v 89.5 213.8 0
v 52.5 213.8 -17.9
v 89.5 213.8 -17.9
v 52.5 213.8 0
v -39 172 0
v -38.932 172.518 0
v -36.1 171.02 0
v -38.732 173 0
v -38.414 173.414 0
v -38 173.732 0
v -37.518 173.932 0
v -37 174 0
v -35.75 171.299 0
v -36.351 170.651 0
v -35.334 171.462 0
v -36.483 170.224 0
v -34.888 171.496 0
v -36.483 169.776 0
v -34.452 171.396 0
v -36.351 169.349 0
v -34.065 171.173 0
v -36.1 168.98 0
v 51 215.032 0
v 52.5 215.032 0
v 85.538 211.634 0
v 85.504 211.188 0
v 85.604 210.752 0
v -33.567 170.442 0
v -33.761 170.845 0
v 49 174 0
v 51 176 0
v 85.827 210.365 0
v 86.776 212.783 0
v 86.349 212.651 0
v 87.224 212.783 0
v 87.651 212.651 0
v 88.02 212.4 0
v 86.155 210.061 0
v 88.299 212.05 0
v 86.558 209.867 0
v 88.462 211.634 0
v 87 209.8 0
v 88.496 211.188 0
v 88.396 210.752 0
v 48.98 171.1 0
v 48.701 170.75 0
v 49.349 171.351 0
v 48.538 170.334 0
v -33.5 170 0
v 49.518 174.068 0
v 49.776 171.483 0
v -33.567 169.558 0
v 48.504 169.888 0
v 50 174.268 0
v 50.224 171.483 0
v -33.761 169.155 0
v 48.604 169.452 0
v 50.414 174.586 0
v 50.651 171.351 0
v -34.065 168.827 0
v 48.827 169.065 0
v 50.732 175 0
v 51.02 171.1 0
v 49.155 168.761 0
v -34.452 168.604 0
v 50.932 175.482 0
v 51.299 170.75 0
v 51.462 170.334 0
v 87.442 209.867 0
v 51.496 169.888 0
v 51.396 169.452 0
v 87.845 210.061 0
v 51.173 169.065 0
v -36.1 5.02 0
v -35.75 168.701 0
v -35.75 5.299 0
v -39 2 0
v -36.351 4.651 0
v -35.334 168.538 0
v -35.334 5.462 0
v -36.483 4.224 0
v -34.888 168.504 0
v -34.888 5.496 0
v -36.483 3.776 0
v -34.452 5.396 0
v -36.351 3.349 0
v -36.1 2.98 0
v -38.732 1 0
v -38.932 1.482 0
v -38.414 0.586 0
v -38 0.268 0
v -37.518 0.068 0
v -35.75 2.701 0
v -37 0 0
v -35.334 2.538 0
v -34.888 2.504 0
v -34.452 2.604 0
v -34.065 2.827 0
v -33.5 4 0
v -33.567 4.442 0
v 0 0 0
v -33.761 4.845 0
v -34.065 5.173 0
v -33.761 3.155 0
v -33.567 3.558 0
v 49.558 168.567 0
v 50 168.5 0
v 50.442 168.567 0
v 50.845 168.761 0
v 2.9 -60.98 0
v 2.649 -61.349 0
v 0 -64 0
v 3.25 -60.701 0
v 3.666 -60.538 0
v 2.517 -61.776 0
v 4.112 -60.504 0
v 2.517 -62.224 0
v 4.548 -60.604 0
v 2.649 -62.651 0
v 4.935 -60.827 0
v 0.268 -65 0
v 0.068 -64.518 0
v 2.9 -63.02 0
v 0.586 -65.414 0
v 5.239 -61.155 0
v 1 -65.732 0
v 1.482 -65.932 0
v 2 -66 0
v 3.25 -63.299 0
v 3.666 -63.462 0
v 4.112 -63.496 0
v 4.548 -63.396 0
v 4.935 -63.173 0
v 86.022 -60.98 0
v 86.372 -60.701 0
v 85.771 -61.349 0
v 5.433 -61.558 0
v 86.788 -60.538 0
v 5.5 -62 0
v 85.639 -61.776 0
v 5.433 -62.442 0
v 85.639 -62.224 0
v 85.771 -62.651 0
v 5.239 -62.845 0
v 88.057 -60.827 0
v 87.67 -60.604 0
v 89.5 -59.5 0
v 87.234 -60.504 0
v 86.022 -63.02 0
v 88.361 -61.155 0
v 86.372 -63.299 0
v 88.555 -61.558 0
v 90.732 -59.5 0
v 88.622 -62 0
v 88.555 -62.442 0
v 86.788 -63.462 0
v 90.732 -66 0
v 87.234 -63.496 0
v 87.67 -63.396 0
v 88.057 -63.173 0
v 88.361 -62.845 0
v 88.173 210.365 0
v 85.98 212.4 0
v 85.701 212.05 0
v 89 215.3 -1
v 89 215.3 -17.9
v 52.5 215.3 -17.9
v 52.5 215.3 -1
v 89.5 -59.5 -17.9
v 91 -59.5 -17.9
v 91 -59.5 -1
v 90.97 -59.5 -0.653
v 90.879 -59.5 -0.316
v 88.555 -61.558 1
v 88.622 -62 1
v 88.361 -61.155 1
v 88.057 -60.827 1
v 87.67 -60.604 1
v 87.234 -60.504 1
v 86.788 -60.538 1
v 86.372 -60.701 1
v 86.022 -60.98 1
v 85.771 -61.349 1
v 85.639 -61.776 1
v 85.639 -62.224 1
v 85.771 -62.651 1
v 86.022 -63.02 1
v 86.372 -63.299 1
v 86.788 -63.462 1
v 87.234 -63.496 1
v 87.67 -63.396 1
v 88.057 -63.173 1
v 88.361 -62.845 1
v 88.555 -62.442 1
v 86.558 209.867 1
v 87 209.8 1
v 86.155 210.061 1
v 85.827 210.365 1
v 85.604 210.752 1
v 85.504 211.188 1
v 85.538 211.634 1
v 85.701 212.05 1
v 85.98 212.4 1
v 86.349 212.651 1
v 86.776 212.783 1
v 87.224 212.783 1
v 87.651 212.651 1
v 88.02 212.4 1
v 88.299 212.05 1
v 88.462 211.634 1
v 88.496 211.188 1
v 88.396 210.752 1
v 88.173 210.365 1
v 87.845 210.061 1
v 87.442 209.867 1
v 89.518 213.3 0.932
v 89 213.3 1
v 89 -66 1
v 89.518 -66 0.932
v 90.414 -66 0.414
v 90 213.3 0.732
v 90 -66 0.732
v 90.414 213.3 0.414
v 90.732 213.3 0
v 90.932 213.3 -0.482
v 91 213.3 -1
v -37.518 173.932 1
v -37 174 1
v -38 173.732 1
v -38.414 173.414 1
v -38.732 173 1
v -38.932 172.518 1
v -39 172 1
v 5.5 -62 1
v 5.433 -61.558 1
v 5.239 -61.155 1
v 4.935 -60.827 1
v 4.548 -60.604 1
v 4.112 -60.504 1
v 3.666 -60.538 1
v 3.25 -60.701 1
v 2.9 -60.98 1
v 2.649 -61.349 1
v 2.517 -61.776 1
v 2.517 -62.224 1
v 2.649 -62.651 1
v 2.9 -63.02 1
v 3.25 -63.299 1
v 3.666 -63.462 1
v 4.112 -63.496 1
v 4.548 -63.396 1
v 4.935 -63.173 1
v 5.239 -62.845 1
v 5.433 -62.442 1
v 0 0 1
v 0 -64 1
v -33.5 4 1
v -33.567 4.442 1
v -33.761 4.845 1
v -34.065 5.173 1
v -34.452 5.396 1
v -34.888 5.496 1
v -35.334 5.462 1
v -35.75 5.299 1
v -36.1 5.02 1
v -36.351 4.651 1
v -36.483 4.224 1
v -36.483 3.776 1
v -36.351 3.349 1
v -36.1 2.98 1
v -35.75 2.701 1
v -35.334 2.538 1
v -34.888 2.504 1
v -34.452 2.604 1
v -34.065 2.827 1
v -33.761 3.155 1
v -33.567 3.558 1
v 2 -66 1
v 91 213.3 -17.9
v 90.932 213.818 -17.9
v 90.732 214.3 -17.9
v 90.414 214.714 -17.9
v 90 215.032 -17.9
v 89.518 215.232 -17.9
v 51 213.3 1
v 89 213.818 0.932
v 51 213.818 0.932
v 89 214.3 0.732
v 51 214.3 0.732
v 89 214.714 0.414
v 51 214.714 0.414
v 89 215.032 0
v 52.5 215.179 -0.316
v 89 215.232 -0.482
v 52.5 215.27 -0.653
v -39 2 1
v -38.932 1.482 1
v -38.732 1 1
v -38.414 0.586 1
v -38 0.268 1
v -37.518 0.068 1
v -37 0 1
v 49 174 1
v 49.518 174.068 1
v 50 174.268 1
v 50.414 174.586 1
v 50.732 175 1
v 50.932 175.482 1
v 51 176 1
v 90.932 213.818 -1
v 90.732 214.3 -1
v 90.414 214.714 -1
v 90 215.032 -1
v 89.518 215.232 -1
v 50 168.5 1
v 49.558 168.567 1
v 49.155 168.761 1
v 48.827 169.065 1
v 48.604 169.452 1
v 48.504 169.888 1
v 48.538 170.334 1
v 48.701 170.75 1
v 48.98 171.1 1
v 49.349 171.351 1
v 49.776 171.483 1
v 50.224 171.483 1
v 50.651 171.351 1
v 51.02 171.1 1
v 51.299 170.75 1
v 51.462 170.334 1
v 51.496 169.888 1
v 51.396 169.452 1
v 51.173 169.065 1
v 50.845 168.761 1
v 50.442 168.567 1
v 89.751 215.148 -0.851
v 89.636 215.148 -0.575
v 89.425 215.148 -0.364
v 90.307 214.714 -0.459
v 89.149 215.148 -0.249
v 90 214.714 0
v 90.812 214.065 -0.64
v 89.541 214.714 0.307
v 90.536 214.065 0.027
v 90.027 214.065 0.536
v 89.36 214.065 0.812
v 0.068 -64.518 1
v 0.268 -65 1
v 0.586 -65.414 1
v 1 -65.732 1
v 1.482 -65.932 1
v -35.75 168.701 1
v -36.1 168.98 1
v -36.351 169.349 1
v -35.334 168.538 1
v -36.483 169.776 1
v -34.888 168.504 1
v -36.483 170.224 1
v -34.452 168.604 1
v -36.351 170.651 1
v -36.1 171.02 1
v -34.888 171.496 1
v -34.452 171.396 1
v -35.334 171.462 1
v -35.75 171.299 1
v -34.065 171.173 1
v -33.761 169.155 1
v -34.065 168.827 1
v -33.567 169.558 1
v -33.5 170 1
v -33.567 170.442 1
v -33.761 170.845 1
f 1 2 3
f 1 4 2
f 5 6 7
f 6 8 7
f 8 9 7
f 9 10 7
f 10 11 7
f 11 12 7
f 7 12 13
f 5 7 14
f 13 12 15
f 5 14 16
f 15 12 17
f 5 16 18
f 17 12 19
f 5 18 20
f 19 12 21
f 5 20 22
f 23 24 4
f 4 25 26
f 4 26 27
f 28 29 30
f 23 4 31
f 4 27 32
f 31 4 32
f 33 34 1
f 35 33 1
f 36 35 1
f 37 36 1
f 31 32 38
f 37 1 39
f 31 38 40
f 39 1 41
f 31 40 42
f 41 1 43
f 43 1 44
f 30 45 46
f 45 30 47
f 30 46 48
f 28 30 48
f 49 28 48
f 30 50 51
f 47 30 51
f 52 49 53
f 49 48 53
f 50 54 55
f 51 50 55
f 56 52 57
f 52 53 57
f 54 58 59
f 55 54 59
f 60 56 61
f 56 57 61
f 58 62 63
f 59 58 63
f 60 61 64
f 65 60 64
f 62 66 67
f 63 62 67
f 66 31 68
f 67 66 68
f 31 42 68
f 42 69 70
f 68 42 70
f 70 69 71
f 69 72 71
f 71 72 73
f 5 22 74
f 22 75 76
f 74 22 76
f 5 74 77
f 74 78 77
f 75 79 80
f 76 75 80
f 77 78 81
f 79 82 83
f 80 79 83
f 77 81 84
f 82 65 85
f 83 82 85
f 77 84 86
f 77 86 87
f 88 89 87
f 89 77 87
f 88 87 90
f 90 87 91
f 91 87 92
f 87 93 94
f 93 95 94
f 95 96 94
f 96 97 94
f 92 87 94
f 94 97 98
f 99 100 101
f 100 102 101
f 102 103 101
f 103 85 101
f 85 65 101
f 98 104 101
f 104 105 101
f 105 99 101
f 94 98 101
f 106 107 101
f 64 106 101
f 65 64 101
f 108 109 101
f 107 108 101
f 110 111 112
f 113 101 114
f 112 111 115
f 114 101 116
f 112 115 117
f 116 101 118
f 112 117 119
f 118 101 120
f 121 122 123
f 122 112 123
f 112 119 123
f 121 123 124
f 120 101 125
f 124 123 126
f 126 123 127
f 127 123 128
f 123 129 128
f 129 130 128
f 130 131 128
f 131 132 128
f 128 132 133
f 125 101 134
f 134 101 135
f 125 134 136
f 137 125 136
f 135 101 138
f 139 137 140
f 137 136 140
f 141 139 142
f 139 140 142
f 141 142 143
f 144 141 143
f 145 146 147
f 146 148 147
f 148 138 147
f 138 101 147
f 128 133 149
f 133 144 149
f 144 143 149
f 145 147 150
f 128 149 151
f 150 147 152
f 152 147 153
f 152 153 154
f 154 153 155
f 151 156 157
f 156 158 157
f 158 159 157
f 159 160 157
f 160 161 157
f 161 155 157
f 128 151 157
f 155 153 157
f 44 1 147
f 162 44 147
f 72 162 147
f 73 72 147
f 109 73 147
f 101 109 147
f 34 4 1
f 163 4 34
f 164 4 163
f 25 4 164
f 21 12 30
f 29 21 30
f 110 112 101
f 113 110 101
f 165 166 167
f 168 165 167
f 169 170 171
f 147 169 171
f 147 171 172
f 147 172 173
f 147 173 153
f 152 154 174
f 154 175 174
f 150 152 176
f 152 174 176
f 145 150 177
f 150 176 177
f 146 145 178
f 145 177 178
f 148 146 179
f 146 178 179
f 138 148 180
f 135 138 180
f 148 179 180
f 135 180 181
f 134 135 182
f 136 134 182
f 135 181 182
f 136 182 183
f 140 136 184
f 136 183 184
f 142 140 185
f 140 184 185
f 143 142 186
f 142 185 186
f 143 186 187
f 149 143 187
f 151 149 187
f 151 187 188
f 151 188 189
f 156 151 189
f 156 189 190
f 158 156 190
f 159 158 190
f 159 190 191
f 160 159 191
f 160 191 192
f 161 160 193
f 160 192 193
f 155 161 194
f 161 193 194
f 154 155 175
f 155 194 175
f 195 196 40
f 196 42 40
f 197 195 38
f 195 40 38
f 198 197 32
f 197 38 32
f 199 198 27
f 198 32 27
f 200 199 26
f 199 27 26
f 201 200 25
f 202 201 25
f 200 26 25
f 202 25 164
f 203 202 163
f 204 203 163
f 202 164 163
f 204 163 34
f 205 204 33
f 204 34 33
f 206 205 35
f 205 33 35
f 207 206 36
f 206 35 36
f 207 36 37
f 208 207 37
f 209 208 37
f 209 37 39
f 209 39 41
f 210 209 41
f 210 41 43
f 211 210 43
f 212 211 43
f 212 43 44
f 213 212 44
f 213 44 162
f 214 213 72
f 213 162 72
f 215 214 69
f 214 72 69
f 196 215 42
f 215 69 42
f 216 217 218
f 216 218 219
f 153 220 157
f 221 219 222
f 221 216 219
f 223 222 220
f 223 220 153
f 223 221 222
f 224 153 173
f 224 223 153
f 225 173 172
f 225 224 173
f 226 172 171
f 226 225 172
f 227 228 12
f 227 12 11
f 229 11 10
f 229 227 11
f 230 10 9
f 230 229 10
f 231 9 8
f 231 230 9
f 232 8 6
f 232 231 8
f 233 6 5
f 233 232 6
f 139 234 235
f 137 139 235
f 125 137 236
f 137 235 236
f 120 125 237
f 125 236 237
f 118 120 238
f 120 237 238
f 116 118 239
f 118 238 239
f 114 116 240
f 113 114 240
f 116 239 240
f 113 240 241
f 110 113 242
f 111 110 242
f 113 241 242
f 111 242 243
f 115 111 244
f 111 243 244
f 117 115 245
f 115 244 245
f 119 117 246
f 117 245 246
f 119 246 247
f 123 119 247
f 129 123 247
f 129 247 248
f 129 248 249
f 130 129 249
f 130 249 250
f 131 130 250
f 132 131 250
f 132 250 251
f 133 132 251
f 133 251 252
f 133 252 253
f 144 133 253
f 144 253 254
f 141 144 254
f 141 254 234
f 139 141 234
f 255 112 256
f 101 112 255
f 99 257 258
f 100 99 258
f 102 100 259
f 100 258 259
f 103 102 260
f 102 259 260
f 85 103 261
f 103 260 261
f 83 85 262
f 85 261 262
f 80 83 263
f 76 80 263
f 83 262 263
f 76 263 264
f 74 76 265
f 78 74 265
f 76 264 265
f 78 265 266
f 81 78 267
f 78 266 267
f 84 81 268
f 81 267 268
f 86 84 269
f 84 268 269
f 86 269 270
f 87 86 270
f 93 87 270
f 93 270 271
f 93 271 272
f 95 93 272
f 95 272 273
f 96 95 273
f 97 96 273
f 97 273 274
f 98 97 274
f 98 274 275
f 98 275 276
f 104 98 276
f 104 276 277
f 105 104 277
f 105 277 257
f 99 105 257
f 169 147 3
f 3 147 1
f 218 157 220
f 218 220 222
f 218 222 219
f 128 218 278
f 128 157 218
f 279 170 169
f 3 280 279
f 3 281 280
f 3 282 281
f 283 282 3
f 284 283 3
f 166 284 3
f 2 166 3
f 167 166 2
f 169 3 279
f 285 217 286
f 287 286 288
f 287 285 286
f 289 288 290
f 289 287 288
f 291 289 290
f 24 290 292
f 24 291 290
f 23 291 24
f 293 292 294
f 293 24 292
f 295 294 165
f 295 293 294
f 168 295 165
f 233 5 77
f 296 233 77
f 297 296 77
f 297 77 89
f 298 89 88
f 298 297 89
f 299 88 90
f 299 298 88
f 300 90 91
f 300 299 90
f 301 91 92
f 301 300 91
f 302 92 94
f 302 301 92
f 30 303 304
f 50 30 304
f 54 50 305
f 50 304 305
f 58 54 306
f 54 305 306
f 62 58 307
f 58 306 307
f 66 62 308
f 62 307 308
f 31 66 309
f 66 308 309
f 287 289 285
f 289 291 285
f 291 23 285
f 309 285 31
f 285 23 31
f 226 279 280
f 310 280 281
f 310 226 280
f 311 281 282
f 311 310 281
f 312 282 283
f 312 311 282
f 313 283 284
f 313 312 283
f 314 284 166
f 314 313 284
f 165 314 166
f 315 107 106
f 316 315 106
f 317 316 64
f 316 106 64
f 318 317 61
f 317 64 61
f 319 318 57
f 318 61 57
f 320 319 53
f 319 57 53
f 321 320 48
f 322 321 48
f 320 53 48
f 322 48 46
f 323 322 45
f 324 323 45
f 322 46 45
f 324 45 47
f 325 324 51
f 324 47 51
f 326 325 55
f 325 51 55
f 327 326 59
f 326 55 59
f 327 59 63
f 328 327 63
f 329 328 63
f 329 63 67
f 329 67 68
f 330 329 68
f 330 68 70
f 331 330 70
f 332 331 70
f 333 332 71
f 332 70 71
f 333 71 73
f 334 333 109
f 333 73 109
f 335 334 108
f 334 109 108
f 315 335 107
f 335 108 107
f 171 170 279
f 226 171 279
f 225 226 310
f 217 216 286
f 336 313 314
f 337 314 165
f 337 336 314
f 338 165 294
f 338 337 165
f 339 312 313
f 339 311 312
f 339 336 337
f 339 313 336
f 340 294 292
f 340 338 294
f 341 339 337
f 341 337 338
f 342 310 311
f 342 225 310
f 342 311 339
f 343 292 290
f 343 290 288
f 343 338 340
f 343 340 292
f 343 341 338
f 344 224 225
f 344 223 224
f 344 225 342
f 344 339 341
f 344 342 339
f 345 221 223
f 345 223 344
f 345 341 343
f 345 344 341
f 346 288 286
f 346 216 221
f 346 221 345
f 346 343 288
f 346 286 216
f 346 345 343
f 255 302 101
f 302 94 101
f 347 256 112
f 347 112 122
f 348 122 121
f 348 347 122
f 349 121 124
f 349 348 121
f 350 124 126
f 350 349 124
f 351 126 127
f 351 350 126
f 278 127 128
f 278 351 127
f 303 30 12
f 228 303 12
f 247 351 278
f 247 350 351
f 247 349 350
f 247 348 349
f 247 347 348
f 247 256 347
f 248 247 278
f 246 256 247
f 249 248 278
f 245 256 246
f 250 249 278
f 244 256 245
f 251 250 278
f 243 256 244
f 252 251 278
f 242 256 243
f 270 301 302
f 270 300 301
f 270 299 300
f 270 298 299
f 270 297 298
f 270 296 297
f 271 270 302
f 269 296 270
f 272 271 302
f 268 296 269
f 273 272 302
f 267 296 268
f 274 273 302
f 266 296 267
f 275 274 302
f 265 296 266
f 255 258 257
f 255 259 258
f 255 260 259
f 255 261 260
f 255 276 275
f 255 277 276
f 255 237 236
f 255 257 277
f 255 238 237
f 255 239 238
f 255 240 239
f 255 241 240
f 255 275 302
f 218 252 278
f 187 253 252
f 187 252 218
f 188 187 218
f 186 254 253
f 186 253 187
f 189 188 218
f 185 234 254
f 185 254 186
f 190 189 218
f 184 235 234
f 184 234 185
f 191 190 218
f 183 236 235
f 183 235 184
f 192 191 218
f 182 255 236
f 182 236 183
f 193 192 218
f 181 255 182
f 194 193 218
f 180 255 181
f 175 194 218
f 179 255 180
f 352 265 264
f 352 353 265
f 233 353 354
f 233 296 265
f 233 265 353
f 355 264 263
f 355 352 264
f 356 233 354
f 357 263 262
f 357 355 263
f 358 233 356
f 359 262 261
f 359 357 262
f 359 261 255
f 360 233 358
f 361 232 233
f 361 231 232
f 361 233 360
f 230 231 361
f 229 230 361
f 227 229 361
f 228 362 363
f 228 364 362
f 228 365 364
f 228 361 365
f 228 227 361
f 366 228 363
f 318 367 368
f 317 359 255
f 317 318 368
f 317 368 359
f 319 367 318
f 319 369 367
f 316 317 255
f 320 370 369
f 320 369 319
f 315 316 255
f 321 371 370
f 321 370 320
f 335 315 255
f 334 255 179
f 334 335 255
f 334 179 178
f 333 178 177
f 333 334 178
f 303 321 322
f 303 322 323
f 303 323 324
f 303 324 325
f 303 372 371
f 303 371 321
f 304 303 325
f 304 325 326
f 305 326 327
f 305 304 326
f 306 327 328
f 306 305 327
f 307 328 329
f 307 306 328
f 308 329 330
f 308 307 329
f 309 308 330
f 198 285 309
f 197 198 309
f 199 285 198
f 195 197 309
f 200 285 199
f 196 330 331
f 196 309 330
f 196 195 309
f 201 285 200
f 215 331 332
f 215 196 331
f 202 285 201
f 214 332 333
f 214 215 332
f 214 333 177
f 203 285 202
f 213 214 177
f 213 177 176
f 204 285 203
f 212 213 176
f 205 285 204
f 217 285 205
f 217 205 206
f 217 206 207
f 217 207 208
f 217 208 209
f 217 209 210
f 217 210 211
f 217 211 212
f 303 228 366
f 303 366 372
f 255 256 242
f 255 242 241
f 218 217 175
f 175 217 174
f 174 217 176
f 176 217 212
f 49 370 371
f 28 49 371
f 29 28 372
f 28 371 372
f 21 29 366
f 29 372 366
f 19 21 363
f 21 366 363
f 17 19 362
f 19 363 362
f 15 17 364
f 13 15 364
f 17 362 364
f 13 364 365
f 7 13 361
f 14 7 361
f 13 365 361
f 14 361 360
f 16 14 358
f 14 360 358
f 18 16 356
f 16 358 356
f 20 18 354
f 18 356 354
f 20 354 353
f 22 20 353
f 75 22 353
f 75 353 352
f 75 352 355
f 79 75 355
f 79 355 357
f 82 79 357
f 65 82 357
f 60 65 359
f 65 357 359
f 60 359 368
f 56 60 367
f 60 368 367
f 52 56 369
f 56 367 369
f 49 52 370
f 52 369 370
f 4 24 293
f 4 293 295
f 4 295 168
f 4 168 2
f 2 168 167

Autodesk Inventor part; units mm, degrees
ref_plane "YZ Plane" through (0, 0, 0) normal (1, 0, 0) x (0, 1, 0)
ref_plane "XZ Plane" through (0, 0, 0) normal (0, 1, 0) x (-1, 0, 0)
ref_plane "XY Plane" through (0, 0, 0) normal (0, 0, 1) x (1, 0, 0)
sketch "Skizze2" plane through (0, 0, 0) normal (0, 0, 1) x (1, 0, 0)
  line L0 (91, -66) -> (91, 215.3)
  line L1 (91, -66) -> (0, -66)
  line L2 (0, -66) -> (0, 0)
  line L3 (91, 215.3) -> (51, 215.3)
  line L4 (51, 215.3) -> (51, 174)
  line L5 (51, 174) -> (-39, 174)
  line L6 (-39, 174) -> (-39, 0)
  line L7 (-39, 0) -> (0, 0)
  line L8 (0, 0) -> (91, 0) construction
  dimension "d0" = 281.3
  dimension "d1" = 91
  dimension "d2" = 66
  dimension "d3" = 40
  dimension "d4" = 41.3
  dimension "d5" = 90
extrude "Extrusion1" add sketch "Skizze2" along normal blind 1
sketch "Skizze3" plane through (0, 0, 1) normal (0, 0, 1) x (1, 0, 0)
  circle A0 centre (4, -62) radius 1.5
  line L0 (0, -66) -> (91, -66) projected
  line L1 (0, 0) -> (0, -66) projected
  circle A1 centre (87.122, -62) radius 1.5
  line L2 (91, -66) -> (91, 215.3) projected
  circle A2 centre (-35, 4) radius 1.5
  line L3 (-39, 0) -> (0, 0) projected
  line L4 (-39, 174) -> (-39, 0) projected
  circle A3 centre (-35, 170) radius 1.5
  line L5 (51, 174) -> (-39, 174) projected
  dimension "d8" = 3
  dimension "d9" = 4
  dimension "d10" = 4
  dimension "d11" = 4
  dimension "d12" = 3
  dimension "d13" = 3.878
  dimension "d14" = 3
  dimension "d15" = 4
  dimension "d16" = 4
  dimension "d17" = 3
  dimension "d18" = 4
  dimension "d19" = 4
extrude "Extrusion2" cut sketch "Skizze3" against normal blind 1.5
sketch "Skizze5" plane through (0, 0, 0) normal (0, 0, -1) x (-1, 0, 0)
  line L0 (0, -66) -> (-91, -66) projected
  line L1 (-91, 215.3) -> (-51, 215.3) projected
  line L2 (-91, -66) -> (-89.5, -66)
  line L3 (-89.5, -66) -> (-89.5, 215.3)
  line L4 (-89.5, 215.3) -> (-91, 215.3)
  line L5 (-91, 215.3) -> (-91, -66)
  line L6 (-51, 215.3) -> (-51, 174) projected
  line L7 (-91, 215.3) -> (-51, 215.3)
  line L8 (-51, 215.3) -> (-51, 213.8)
  line L9 (-51, 213.8) -> (-91, 213.8)
  line L10 (-91, 213.8) -> (-91, 215.3)
  point P0 (0, 0)
  point P1 (-89.5, 213.8)
  dimension "d36" = 1.5
  dimension "d43" = 1.5
extrude "Extrusion4" add sketch "Skizze5" along normal blind 17.9
sketch "Skizze6" plane through (91, -66, 1) normal (1, 0, 0) x (0, 0, -1)
  line L0 (0, 0) -> (18.9, 0) projected
  line L1 (18.9, 0) -> (18.9, 279.8) projected
  line L2 (1, 0) -> (18.9, 0)
  line L3 (18.9, 0) -> (18.9, 6.5)
  line L4 (18.9, 6.5) -> (1, 6.5)
  line L5 (1, 6.5) -> (1, 0)
  line L6 (1, 279.8) -> (1, 0) projected
  line L7 (18.9, 0) -> (18.9, 279.8) projected
  line L8 (1, 0) -> (18.9, 0) projected
  line L9 (1, 279.8) -> (18.9, 279.8) projected
  point P0 (1, 66)
  point P1 (18.4, 281.3)
  dimension "d39" = 6.5
extrude "Extrusion5" cut sketch "Skizze6" against normal blind 1.5 contours L5 L4 L1 L0
fillet "Rundung1" radius 2 7 edges at (91, 74.65, 1) (91, 215.3, -8.45) (71, 215.3, 1) (51, 174, 0.5) (-39, 174, 0.5) (-39, 0, 0.5) (0, -66, 0.5)
sketch "Skizze7" plane through (0, 0, 1) normal (0, 0, 1) x (1, 0, 0)
  line L0 (89, 215.3) -> (51, 215.3) projected
  line L1 (91, -59.5) -> (91, 213.3) projected
  line L2 (49, 174) -> (-37, 174) projected
  line L3 (51, 213.3) -> (51, 176) projected
  point P0 (0, 0)
  point P1 (87, 211.3)
  point P2 (50, 170)
  dimension "d44" = 4
  dimension "d45" = 4
  dimension "d53" = 4
  dimension "d54" = 1
hole "Bohrung1" at (87, 211.3, 1) at (50, 170, 1) direction (0, 0, -1) diameter 3 depth 1
sketch "Skizze10" plane through (51, 215.3, -1) normal (0, 1, 0) x (1, 0, 0)
  line L0 (0, -1) -> (0, 16.9) projected
  line L1 (38.5, 16.9) -> (0, 16.9) projected
  line L2 (0, -1) -> (1.5, -1)
  line L3 (1.5, -1) -> (1.5, 16.9)
  line L4 (1.5, 16.9) -> (0, 16.9)
  line L5 (0, 16.9) -> (0, -1)
  point P0 (-51, -1)
  dimension "d58" = 1.5
extrude "Extrusion7" cut sketch "Skizze10" against normal up to surface (1.5 mm away)
properties part number "PCB_Qfab_Deckel"
